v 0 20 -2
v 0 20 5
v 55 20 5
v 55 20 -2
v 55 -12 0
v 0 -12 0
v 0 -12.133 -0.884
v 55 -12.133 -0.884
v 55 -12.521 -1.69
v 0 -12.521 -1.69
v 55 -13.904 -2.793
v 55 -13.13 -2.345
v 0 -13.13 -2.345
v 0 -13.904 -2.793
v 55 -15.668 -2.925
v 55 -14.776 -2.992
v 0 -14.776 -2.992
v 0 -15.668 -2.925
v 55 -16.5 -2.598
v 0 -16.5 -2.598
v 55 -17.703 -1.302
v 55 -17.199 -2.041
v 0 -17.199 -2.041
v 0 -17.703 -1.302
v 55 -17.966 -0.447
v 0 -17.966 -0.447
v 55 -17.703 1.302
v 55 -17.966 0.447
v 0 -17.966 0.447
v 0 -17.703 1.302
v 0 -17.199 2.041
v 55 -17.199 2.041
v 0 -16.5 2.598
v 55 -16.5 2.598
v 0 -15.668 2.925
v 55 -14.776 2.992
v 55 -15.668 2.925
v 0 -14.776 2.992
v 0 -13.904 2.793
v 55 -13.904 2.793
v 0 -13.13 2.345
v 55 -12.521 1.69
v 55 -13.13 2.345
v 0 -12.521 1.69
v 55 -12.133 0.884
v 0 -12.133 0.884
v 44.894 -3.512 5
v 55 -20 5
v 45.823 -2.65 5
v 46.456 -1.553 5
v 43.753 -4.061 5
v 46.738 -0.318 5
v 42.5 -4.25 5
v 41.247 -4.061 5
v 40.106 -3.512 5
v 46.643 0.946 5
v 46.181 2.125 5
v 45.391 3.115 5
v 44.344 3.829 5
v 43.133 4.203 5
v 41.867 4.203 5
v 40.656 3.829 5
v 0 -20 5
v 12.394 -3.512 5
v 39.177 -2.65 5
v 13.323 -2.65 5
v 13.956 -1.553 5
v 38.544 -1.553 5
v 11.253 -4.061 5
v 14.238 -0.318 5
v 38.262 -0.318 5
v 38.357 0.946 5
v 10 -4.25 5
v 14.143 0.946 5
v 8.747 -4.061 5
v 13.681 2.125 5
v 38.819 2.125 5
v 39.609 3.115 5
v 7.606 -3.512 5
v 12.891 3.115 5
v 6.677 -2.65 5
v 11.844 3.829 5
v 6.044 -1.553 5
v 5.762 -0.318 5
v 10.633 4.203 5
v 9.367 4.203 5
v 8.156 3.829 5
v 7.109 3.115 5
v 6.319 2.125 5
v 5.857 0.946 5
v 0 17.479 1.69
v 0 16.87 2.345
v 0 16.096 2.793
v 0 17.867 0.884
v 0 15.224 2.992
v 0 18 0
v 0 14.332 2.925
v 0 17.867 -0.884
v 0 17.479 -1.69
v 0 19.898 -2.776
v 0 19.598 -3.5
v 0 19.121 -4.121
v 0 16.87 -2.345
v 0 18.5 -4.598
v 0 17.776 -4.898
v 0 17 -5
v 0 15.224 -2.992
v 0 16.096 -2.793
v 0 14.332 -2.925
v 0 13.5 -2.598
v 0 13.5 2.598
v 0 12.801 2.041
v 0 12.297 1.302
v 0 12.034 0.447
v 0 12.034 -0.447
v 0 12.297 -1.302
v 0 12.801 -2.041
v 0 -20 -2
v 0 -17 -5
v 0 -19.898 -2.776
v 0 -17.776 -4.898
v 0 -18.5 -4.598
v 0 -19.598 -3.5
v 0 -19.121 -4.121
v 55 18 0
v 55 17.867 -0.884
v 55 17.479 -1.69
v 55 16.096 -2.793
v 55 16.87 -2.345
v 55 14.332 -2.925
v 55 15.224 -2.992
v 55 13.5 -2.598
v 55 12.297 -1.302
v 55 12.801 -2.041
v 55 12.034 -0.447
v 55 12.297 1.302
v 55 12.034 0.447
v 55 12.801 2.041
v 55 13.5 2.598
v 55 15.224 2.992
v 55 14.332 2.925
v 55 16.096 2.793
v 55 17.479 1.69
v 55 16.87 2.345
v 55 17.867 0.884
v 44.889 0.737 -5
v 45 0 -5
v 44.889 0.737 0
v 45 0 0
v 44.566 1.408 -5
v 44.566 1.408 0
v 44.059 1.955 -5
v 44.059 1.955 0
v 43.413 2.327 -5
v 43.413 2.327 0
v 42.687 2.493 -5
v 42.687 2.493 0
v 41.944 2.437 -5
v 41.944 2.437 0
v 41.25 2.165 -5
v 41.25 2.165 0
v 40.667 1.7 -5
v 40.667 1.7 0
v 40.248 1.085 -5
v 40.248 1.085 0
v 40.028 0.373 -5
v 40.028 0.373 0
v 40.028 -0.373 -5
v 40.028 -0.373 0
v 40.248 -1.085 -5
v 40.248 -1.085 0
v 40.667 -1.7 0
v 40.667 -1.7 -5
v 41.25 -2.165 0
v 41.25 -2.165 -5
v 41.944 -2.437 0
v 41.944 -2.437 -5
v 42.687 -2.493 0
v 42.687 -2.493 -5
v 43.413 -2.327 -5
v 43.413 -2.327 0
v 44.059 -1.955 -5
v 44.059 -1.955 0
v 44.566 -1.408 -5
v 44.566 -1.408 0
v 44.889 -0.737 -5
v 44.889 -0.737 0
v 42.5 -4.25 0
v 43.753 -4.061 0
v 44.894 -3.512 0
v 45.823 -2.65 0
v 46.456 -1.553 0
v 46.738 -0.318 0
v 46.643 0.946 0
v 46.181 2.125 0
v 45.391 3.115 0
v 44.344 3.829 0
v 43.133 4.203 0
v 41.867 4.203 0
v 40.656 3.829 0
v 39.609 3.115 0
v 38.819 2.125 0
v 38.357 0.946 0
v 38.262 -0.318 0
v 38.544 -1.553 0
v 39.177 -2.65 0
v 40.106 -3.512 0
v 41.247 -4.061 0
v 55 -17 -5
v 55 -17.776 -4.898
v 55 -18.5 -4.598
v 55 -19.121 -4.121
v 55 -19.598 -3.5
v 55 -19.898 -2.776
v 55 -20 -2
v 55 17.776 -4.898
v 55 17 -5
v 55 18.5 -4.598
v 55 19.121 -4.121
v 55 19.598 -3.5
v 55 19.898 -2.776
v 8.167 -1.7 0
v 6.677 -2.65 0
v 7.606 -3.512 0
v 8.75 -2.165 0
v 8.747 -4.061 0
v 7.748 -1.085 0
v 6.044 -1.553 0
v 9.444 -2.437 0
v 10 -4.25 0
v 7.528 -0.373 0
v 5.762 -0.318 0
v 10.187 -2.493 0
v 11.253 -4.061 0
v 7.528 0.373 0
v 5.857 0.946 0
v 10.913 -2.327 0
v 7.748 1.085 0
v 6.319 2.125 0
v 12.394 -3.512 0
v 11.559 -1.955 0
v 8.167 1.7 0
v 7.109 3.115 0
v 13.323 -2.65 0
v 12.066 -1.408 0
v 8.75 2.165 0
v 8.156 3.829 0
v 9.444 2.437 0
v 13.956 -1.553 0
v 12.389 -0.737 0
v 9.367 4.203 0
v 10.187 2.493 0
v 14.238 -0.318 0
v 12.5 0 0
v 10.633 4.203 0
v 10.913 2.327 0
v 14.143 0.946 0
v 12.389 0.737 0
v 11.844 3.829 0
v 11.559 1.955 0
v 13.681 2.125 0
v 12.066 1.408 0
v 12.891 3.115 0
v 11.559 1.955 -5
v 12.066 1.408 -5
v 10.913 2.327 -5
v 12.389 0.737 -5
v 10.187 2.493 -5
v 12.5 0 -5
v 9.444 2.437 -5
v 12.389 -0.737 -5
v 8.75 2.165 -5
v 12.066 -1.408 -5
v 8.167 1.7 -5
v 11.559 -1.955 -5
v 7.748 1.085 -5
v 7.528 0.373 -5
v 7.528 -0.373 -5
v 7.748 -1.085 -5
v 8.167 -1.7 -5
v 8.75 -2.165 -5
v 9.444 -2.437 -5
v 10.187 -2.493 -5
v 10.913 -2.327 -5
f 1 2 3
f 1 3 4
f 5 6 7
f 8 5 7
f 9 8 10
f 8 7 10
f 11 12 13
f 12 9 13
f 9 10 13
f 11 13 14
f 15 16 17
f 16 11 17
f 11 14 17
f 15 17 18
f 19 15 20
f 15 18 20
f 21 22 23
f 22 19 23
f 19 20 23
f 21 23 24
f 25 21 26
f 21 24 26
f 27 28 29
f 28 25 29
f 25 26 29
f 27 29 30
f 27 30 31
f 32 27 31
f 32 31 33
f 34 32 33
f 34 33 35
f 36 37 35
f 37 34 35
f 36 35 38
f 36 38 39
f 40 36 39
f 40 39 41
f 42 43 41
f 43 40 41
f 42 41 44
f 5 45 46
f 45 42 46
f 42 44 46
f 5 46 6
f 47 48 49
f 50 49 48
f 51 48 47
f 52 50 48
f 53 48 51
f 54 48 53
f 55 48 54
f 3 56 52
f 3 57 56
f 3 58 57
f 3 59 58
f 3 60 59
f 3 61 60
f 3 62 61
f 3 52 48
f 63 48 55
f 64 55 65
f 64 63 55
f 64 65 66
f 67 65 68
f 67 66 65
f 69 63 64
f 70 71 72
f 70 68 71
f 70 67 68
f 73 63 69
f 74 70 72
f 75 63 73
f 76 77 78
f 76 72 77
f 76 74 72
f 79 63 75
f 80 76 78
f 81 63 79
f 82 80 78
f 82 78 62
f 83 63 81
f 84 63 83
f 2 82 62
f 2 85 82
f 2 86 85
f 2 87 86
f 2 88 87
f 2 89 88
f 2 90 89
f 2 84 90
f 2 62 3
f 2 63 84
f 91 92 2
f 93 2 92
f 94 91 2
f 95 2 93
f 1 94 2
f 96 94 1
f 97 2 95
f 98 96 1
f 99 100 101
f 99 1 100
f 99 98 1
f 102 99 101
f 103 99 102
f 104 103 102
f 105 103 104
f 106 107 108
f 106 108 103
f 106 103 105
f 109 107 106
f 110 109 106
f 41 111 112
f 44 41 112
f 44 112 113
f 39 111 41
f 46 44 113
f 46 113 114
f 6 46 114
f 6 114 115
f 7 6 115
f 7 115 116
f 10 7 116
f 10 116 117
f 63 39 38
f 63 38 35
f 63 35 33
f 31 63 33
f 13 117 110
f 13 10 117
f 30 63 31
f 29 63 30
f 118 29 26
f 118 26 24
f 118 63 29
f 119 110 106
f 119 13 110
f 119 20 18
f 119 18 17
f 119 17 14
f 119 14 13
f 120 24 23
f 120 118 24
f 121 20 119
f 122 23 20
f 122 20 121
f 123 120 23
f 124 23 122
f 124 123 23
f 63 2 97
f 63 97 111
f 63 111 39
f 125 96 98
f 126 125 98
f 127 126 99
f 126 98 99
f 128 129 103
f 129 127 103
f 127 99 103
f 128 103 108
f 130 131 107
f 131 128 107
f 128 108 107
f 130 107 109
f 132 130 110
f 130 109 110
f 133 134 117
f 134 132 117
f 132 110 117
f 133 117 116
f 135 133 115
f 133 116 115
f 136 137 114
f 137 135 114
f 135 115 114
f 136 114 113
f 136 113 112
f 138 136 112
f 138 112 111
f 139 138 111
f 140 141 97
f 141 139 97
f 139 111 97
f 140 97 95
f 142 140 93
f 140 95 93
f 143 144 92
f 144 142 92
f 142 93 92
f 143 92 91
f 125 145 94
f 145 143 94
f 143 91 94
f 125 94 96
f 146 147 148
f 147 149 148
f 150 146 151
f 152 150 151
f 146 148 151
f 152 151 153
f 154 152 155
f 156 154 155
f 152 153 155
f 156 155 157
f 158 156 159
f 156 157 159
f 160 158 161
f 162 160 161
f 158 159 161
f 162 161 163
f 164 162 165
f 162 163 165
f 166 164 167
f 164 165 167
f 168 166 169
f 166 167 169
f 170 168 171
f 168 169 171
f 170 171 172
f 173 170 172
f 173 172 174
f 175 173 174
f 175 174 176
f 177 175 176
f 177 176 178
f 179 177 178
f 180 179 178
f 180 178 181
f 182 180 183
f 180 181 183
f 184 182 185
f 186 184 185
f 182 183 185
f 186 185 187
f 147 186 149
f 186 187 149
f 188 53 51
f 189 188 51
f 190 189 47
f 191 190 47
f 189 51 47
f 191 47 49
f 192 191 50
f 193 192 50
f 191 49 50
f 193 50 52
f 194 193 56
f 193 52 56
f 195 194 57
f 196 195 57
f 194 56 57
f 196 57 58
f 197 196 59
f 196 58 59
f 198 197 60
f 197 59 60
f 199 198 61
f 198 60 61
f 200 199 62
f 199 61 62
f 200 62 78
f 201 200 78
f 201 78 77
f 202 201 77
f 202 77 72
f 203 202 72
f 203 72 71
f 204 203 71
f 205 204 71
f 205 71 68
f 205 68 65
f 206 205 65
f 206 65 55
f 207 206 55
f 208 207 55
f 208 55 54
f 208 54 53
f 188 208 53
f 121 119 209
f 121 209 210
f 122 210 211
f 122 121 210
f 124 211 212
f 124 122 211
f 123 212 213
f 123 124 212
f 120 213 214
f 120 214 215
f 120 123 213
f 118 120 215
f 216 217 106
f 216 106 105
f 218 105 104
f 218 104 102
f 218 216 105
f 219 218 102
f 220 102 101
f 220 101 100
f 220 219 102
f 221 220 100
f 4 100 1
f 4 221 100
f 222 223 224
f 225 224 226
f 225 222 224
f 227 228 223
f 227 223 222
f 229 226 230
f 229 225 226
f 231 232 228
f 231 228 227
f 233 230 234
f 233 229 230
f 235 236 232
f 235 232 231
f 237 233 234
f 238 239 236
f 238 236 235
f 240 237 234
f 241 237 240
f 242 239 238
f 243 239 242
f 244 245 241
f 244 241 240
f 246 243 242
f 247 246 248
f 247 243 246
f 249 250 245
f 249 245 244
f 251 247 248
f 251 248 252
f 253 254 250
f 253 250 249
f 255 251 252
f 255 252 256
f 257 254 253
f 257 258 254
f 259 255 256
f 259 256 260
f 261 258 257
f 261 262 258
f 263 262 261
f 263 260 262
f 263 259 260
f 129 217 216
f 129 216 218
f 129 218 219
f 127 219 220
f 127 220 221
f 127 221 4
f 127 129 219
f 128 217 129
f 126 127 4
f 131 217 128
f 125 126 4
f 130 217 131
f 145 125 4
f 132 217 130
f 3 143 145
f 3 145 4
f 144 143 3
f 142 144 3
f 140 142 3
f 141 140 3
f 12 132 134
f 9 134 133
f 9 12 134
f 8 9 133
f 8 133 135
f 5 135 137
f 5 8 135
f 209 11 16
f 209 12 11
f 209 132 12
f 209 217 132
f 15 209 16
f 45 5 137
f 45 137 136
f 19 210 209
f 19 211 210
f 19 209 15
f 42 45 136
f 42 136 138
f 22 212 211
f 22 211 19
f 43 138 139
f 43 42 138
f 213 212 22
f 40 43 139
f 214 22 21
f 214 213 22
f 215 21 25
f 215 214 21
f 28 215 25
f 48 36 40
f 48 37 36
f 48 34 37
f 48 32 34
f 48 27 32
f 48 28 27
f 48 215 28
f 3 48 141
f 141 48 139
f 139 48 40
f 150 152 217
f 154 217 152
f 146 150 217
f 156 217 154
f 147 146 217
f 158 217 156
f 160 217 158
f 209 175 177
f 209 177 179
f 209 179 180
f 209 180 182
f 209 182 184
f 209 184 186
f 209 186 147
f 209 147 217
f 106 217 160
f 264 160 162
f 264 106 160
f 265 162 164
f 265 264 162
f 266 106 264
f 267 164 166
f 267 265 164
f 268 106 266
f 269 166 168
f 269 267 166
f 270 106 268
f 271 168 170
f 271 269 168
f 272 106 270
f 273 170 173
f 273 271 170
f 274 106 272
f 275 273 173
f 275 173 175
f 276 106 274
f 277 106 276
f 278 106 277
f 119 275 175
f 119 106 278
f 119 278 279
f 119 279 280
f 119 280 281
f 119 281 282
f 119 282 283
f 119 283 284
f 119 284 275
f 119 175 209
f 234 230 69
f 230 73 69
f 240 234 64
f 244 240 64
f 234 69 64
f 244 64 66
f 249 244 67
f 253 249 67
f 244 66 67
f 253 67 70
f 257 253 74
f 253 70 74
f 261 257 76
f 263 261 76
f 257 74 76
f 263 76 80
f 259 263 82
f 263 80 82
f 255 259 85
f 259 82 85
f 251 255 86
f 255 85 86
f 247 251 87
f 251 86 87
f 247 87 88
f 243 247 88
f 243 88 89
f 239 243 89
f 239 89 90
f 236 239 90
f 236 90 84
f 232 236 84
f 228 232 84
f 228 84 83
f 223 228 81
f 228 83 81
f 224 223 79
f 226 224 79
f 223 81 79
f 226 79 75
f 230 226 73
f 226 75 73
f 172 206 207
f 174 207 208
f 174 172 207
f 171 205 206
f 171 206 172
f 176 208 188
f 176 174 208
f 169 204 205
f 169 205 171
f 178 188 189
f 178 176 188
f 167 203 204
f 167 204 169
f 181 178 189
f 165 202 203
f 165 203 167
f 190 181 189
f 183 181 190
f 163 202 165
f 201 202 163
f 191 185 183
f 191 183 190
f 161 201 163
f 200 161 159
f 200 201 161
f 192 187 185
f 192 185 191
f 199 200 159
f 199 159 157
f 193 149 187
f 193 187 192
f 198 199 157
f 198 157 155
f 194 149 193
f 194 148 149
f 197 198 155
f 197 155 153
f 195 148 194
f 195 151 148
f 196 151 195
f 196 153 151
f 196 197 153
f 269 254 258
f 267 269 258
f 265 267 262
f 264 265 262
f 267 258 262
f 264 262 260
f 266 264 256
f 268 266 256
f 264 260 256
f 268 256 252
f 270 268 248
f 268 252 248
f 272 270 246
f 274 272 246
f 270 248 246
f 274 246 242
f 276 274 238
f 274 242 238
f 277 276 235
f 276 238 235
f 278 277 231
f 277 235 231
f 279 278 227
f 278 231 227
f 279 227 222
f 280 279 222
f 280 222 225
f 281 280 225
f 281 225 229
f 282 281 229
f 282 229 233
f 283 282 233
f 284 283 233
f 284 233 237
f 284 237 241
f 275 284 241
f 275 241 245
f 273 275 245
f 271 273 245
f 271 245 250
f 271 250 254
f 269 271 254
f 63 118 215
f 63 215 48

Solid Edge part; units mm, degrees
sketch "Sketch1" plane through (0, 0, 0) normal (1, 0, 0) x (0, 1, 0)
  circle A0 centre (-15, 0) radius 3
  circle A1 centre (15, 0) radius 3
  line L0 (20, -5) -> (-20, -5)
  line L1 (-20, -5) -> (-20, 5)
  line L2 (-20, 5) -> (20, 5)
  line L3 (20, 5) -> (20, -5)
  dimension "D1" = 40
  dimension "D2" = 10
  dimension "D3" = 15
  dimension "D4" = 6
extrude "Protrusion1" add sketch "Sketch1" along normal blind 50
sketch "Sketch2" plane through (25, 0, 5) normal (0, 0, 1) x (1, 0, 0)
  circle A0 centre (17.5, 0) radius 2.5
  circle A1 centre (-15, 0) radius 2.5
  dimension "D1" = 5
  dimension "D2" = 5
  dimension "D3" = 10
  dimension "D4" = 32.5
extrude "Cutout1" cut sketch "Sketch2" against normal up to next
sketch "Sketch3" plane through (50, 0, 0) normal (1, 0, 0) x (0, 1, 0)
  line L0 (-20, -5) -> (20, -5)
  line L1 (20, -5) -> (20, 5)
  line L2 (20, 5) -> (-20, 5)
  line L3 (-20, 5) -> (-20, -5)
  circle A0 centre (15, 0) radius 3
  circle A1 centre (-15, 0) radius 3
extrude "ExtrudedProtrusion_4" add sketch "Sketch3" along normal blind 5
fillet "Round_1" radius 3 2 edges at (27.5, -20, -5) (27.5, 20, -5)
sketch "Sketch4" plane through (27.5, 0, 5) normal (0, 0, 1) x (0, -1, 0)
  circle A0 centre (0, -17.5) radius 4.25
  circle A1 centre (0, 15) radius 4.25
  dimension "D1" = 8.5
  dimension "D2" = 8.5
extrude "ExtrudedCutout_2" cut sketch "Sketch4" against normal blind 5
properties material "ABS Plastic, high impact"
